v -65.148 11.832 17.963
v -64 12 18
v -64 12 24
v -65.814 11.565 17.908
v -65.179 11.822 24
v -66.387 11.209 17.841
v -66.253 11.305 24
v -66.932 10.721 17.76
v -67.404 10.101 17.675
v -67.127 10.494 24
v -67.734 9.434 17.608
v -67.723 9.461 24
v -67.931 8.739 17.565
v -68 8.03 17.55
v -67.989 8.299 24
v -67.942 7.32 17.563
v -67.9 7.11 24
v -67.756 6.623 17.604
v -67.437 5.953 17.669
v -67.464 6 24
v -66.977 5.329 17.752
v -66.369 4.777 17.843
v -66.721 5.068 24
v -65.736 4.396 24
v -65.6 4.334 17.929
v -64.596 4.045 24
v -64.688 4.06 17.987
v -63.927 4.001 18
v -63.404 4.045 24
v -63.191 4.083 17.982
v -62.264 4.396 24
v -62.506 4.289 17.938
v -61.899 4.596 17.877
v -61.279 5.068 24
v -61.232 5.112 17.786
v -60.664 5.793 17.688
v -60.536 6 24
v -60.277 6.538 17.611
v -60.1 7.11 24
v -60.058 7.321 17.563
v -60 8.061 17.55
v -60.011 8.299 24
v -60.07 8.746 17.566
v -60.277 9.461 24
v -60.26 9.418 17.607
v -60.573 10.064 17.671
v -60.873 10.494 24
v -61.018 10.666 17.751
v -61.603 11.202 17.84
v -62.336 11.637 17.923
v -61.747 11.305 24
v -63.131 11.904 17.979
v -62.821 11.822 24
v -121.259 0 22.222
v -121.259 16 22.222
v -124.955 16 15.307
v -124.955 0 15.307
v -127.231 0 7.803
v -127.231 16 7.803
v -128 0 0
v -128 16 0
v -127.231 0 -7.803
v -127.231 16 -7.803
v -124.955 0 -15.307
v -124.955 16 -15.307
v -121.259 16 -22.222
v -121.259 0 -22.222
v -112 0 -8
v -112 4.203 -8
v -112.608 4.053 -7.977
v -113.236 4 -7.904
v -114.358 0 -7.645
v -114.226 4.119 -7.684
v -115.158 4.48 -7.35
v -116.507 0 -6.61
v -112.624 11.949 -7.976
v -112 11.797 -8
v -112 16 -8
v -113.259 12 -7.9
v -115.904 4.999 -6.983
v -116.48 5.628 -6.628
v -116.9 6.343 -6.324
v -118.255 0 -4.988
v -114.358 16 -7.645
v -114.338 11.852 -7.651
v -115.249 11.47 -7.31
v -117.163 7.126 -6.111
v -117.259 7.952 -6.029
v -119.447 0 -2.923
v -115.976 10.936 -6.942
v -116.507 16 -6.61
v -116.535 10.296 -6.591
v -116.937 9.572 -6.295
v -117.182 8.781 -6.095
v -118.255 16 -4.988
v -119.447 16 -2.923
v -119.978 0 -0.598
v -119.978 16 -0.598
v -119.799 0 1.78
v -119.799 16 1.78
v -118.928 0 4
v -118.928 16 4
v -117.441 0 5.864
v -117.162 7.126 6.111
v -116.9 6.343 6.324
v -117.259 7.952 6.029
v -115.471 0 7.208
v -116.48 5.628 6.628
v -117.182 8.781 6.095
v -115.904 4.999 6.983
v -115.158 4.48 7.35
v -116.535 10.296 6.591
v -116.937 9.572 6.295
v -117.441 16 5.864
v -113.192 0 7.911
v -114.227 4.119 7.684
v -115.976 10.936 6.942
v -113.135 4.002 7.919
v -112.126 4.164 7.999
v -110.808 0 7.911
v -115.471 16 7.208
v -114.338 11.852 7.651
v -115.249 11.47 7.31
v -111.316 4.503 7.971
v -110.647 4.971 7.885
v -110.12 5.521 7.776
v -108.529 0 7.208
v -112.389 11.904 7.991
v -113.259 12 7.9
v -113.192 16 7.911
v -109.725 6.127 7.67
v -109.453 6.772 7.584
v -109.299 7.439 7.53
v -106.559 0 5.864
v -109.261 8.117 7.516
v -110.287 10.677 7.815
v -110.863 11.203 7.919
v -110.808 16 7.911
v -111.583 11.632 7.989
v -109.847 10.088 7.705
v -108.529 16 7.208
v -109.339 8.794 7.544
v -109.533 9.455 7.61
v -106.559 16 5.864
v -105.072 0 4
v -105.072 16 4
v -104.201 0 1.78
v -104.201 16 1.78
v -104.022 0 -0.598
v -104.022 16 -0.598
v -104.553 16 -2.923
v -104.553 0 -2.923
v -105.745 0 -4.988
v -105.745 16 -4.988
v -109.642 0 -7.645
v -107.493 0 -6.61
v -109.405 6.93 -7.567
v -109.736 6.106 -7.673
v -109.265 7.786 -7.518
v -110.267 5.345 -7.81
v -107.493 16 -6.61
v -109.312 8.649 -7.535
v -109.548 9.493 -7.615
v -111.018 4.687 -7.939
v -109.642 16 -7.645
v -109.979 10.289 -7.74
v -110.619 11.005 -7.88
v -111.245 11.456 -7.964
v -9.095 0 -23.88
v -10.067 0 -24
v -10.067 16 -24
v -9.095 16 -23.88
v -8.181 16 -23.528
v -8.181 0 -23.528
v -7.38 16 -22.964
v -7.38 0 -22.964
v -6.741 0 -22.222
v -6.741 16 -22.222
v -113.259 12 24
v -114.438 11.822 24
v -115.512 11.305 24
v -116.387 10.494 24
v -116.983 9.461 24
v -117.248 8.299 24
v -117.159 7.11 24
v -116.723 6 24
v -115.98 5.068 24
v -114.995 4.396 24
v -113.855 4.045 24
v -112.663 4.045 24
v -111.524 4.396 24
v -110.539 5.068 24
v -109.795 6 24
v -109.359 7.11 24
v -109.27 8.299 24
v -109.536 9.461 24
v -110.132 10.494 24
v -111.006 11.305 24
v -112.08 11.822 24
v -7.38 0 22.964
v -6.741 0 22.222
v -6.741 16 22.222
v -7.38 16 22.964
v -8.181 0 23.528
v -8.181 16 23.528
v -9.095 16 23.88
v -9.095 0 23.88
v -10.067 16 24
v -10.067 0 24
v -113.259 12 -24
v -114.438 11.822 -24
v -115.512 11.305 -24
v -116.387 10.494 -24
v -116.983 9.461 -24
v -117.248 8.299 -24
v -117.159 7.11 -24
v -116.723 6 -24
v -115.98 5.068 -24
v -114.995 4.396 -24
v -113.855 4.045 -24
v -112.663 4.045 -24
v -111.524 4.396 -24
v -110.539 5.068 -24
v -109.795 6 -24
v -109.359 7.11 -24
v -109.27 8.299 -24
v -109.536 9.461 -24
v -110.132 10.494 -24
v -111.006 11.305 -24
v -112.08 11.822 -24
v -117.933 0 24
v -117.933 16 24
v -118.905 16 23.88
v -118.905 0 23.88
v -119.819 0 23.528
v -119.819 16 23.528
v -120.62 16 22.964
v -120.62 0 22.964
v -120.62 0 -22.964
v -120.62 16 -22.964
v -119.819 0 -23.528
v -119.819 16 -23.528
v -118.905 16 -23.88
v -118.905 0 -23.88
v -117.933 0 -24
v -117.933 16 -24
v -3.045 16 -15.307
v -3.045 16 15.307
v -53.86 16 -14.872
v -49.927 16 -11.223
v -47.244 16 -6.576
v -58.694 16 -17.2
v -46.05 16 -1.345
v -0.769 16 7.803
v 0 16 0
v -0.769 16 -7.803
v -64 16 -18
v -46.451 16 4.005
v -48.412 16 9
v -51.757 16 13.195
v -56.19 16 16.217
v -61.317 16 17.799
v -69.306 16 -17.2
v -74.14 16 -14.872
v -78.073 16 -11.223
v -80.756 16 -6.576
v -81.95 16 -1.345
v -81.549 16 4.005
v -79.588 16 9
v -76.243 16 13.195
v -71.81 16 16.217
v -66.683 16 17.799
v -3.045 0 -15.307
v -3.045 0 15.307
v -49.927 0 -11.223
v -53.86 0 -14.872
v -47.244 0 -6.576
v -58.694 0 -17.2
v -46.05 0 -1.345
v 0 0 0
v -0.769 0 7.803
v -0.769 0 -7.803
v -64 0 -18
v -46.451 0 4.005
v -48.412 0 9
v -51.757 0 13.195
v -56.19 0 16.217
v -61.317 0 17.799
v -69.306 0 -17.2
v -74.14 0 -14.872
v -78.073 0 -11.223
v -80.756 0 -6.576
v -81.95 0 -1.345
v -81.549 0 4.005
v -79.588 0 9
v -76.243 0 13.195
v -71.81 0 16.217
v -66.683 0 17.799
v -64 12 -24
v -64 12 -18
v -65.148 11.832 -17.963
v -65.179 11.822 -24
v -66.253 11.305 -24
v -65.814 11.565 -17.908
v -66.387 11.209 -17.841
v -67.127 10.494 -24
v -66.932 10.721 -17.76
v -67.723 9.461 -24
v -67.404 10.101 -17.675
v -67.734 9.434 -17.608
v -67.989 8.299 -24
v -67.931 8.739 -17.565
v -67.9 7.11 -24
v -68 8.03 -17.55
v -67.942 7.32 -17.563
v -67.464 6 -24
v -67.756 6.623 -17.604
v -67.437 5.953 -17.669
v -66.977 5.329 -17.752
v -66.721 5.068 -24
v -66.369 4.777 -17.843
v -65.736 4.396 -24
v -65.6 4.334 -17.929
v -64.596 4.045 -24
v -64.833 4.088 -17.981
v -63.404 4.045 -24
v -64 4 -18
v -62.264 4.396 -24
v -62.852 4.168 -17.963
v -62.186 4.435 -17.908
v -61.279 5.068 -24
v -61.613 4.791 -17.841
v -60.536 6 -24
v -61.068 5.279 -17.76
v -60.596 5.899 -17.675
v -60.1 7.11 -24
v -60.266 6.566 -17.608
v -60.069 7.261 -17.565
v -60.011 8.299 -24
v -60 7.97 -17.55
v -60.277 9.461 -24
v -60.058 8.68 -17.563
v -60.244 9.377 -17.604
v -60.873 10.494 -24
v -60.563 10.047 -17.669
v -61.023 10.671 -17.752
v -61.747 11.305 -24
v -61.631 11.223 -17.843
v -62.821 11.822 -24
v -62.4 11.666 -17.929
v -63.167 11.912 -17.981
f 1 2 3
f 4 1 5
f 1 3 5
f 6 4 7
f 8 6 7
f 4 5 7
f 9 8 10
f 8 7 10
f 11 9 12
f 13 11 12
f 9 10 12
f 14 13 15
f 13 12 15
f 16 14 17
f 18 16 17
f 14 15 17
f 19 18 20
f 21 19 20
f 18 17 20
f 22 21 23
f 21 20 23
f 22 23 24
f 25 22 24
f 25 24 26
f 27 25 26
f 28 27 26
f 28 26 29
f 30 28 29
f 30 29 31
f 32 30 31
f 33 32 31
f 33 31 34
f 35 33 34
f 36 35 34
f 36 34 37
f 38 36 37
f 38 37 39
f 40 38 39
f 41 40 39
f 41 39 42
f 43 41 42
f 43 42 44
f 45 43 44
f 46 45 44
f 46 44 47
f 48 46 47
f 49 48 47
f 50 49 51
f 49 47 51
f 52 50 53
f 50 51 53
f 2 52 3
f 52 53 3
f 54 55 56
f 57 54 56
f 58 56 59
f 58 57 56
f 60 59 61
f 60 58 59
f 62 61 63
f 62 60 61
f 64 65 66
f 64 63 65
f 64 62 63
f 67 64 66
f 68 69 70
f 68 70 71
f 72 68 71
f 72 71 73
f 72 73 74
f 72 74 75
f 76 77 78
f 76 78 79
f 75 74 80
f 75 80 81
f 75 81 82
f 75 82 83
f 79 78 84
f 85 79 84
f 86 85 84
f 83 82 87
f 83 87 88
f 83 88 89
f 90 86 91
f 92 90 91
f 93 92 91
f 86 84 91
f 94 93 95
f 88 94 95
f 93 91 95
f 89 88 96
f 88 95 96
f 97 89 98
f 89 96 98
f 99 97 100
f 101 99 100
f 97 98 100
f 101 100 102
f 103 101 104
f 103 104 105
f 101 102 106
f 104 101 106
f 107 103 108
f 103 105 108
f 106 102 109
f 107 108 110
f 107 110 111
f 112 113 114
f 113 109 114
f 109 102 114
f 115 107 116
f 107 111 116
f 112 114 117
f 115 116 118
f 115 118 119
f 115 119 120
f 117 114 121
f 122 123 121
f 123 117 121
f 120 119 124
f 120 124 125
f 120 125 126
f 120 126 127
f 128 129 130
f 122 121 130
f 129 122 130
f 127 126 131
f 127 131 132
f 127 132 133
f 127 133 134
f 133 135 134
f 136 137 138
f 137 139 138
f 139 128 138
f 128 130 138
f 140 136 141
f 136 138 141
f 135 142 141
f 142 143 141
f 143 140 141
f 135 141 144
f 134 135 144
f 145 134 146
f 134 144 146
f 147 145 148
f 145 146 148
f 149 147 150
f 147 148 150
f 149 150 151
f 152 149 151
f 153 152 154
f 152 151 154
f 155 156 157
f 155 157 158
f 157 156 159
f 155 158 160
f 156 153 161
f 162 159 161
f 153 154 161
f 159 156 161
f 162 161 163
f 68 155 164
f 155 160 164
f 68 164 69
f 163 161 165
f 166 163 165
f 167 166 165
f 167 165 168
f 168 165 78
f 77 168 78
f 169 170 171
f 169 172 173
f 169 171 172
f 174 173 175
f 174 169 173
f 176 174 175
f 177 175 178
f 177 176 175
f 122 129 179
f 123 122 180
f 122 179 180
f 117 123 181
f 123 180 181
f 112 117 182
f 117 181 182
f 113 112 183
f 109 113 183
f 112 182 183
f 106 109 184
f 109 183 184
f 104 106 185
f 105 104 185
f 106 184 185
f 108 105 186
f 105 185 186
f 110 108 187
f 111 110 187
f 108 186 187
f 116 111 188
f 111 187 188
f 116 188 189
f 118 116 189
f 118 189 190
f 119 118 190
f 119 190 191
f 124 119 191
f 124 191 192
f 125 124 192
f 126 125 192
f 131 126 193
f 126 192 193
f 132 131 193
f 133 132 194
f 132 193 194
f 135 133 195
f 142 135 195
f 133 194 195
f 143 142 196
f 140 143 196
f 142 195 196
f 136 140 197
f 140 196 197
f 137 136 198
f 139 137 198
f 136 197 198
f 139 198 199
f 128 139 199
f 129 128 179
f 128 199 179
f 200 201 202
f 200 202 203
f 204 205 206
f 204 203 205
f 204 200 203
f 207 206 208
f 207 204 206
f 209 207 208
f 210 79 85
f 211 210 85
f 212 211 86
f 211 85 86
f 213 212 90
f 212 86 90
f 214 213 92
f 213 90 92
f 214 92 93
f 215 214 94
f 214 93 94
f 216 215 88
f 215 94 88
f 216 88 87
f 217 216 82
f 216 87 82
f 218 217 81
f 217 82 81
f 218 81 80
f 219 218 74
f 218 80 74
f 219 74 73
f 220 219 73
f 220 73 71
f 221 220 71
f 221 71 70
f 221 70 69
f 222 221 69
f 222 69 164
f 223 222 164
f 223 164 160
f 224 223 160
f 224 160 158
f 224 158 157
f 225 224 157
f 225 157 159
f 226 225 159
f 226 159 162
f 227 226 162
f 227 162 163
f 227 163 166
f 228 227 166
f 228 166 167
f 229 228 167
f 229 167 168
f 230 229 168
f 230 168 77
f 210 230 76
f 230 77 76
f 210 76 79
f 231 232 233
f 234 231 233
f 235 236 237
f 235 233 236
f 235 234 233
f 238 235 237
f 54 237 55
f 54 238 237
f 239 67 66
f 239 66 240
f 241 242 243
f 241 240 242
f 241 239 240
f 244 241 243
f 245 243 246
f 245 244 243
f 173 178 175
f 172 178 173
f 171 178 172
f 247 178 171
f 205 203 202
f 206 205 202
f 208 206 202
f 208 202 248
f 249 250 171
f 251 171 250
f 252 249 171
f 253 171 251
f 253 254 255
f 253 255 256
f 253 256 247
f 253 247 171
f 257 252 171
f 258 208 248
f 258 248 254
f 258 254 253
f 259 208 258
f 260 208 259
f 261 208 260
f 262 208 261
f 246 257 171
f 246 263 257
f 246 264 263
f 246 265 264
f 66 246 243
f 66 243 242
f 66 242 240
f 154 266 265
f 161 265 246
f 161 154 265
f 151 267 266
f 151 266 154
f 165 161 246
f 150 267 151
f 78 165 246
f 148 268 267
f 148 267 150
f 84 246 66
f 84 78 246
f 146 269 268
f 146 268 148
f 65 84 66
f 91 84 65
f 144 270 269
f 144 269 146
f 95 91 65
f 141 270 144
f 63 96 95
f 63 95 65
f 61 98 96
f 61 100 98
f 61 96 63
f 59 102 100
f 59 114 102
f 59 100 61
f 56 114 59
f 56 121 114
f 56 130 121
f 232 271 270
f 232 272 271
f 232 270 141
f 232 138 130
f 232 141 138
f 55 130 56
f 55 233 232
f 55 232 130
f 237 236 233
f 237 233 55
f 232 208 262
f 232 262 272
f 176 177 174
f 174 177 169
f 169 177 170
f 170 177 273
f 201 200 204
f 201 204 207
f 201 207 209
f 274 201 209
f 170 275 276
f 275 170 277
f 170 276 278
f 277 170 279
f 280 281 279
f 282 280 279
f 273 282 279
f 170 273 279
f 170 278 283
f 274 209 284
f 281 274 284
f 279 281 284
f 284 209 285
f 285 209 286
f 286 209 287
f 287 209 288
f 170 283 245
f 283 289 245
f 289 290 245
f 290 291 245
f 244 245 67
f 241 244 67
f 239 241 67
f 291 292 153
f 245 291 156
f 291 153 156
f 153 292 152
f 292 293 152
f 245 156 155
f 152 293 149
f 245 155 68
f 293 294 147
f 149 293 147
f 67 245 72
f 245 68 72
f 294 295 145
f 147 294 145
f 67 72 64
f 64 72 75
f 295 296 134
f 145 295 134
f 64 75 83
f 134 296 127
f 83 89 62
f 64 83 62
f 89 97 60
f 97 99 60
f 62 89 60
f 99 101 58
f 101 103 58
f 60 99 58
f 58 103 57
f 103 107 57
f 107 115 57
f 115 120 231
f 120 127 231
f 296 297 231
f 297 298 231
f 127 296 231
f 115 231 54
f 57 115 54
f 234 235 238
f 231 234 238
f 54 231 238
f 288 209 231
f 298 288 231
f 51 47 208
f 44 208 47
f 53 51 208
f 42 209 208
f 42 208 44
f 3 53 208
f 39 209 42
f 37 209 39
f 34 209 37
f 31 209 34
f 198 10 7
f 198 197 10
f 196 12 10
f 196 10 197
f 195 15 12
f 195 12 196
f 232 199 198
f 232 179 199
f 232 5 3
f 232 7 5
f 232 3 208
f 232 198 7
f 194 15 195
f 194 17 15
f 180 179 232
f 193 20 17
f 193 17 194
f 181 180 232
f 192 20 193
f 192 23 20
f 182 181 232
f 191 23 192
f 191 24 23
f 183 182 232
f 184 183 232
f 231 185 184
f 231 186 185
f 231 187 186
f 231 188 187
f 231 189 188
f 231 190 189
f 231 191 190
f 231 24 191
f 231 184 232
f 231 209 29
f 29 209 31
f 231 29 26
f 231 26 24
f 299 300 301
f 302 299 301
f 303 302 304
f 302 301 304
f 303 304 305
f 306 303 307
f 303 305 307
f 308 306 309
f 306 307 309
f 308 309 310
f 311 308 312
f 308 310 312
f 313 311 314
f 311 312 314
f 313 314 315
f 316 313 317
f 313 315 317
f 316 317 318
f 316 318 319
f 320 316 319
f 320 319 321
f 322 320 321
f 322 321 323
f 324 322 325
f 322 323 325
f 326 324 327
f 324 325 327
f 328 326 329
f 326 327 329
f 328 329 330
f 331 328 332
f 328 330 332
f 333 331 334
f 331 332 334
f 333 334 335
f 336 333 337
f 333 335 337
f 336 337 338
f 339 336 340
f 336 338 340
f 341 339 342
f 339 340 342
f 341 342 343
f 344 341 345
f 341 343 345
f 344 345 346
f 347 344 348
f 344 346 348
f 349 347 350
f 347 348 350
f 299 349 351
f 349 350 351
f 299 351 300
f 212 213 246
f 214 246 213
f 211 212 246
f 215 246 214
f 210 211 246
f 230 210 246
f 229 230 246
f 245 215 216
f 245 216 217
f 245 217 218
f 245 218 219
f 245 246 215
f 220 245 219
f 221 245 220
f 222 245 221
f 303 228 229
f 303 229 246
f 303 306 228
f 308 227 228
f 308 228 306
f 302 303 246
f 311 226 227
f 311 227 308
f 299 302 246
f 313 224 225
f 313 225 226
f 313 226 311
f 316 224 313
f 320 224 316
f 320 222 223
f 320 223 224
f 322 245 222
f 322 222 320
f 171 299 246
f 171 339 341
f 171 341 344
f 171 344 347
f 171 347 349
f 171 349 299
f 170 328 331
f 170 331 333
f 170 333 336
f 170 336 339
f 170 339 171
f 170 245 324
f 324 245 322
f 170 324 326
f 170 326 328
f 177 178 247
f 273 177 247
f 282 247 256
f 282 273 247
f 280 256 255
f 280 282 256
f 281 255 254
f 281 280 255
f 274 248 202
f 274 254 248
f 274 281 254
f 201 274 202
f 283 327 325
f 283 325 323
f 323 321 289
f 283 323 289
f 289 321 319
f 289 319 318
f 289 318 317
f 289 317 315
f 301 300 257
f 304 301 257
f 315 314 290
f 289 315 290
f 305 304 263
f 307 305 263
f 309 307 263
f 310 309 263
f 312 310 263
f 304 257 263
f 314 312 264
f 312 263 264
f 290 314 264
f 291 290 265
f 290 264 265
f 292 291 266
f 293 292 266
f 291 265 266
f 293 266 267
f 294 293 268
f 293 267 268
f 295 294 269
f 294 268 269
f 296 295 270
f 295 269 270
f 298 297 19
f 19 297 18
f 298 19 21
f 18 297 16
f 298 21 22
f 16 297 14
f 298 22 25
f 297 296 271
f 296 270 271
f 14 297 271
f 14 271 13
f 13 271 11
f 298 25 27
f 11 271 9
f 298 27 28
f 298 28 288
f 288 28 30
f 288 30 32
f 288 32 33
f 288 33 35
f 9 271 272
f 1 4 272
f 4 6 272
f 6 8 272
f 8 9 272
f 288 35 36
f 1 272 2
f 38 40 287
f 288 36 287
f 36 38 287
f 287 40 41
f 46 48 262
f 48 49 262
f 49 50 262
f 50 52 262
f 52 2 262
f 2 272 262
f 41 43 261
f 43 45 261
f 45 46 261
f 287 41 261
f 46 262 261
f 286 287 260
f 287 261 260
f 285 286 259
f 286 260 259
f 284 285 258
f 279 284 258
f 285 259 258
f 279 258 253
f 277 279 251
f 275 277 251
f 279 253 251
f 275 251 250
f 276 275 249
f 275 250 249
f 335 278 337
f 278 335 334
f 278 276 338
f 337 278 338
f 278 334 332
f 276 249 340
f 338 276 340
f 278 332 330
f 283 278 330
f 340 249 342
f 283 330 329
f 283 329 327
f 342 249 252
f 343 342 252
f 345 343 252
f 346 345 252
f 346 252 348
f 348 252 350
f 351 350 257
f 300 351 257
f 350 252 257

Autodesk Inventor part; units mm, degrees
ref_plane "YZ Plane" through (0, 0, 0) normal (1, 0, 0) x (0, 1, 0)
ref_plane "XZ Plane" through (0, 0, 0) normal (0, 1, 0) x (-1, 0, 0)
ref_plane "XY Plane" through (0, 0, 0) normal (0, 0, 1) x (1, 0, 0)
sketch "Skizze1" plane through (0, 0, 0) normal (0, 1, 0) x (-1, 0, 0)
  line L0 (10.0667, 24) -> (117.9333, 24)
  line L1 (117.9333, -24) -> (10.0667, -24)
  line L2 (0, 0) -> (128, 0) construction
  arc A0 (6.7408, 22.2222) -> (6.7408, -22.2222) centre (40, 0) ccw
  arc A1 (121.2592, -22.2222) -> (121.2592, 22.2222) centre (88, 0) ccw
  arc A2 (121.2592, 22.2222) -> (117.9333, 24) centre (117.9333, 20) ccw
  arc A3 (117.9333, -24) -> (121.2592, -22.2222) centre (117.9333, -20) ccw
  arc A4 (6.7408, -22.2222) -> (10.0667, -24) centre (10.0667, -20) ccw
  arc A5 (10.0667, 24) -> (6.7408, 22.2222) centre (10.0667, 20) ccw
  point P0 (120, -24)
  point P1 (120, -24)
  point P2 (120, -24)
  point P3 (120, 24)
  point P4 (120, 24)
  point P5 (120, 24)
  point P6 (8, -24)
  point P7 (8, -24)
  point P8 (8, -24)
  point P9 (8, 24)
  point P10 (8, 24)
  point P11 (8, 24)
  point P12 (128, 0)
  dimension "d1" = 0
  dimension "d3" = 0
  dimension "d2" = 48
  dimension "d24" = 128
  dimension "d25" = 4
  dimension "d26" = 40
  dimension "d27" = 40
extrude "Extrusion1" add sketch "Skizze1" along normal blind 16
sketch "Skizze2" plane through (0, 0, 0) normal (0, 1, 0) x (1, 0, 0)
  line L0 (-117.9333, -24) -> (-10.0667, -24) projected
  arc A0 (-121.2592, 22.2222) -> (-121.2592, -22.2222) centre (-88, 0) ccw projected
  point P0 (0, 0)
  point P1 (-64, 0)
  point P2 (2, 0)
  point P3 (-112, 0)
  point P4 (2, 0)
  point P5 (-128, 0)
  point P6 (-64, -24)
  dimension "d29" = 48
hole "Bohrung1" at (-64, 0, 0) direction (0, 1, 0) diameter 36 depth 16
hole "Bohrung2" at (-112, 0, 0) direction (0, 1, 0) diameter 16 depth 16
sketch "Skizze3" plane through (-10.0667, 0, -24) normal (0, 0, -1) x (-1, 0, 0)
  line L0 (0, 0) -> (0, 16) projected
  line L1 (111.1924, 0) -> (111.1924, 16) projected
  line L2 (0, 0) -> (107.8665, 0) projected
  point P0 (-10.0667, 0)
  point P1 (103.1924, 8)
  point P2 (0, 8)
  point P3 (53.9333, 8)
  point P4 (53.9333, 0)
  dimension "d37" = 8
hole "Bohrung3" at (-113.2592, 8, -24) direction (0, 0, 1) diameter 8 end through all
hole "Bohrung4" at (-64, 8, -24) direction (0, 0, 1) diameter 8 end through all
properties part number "wheel_support"
